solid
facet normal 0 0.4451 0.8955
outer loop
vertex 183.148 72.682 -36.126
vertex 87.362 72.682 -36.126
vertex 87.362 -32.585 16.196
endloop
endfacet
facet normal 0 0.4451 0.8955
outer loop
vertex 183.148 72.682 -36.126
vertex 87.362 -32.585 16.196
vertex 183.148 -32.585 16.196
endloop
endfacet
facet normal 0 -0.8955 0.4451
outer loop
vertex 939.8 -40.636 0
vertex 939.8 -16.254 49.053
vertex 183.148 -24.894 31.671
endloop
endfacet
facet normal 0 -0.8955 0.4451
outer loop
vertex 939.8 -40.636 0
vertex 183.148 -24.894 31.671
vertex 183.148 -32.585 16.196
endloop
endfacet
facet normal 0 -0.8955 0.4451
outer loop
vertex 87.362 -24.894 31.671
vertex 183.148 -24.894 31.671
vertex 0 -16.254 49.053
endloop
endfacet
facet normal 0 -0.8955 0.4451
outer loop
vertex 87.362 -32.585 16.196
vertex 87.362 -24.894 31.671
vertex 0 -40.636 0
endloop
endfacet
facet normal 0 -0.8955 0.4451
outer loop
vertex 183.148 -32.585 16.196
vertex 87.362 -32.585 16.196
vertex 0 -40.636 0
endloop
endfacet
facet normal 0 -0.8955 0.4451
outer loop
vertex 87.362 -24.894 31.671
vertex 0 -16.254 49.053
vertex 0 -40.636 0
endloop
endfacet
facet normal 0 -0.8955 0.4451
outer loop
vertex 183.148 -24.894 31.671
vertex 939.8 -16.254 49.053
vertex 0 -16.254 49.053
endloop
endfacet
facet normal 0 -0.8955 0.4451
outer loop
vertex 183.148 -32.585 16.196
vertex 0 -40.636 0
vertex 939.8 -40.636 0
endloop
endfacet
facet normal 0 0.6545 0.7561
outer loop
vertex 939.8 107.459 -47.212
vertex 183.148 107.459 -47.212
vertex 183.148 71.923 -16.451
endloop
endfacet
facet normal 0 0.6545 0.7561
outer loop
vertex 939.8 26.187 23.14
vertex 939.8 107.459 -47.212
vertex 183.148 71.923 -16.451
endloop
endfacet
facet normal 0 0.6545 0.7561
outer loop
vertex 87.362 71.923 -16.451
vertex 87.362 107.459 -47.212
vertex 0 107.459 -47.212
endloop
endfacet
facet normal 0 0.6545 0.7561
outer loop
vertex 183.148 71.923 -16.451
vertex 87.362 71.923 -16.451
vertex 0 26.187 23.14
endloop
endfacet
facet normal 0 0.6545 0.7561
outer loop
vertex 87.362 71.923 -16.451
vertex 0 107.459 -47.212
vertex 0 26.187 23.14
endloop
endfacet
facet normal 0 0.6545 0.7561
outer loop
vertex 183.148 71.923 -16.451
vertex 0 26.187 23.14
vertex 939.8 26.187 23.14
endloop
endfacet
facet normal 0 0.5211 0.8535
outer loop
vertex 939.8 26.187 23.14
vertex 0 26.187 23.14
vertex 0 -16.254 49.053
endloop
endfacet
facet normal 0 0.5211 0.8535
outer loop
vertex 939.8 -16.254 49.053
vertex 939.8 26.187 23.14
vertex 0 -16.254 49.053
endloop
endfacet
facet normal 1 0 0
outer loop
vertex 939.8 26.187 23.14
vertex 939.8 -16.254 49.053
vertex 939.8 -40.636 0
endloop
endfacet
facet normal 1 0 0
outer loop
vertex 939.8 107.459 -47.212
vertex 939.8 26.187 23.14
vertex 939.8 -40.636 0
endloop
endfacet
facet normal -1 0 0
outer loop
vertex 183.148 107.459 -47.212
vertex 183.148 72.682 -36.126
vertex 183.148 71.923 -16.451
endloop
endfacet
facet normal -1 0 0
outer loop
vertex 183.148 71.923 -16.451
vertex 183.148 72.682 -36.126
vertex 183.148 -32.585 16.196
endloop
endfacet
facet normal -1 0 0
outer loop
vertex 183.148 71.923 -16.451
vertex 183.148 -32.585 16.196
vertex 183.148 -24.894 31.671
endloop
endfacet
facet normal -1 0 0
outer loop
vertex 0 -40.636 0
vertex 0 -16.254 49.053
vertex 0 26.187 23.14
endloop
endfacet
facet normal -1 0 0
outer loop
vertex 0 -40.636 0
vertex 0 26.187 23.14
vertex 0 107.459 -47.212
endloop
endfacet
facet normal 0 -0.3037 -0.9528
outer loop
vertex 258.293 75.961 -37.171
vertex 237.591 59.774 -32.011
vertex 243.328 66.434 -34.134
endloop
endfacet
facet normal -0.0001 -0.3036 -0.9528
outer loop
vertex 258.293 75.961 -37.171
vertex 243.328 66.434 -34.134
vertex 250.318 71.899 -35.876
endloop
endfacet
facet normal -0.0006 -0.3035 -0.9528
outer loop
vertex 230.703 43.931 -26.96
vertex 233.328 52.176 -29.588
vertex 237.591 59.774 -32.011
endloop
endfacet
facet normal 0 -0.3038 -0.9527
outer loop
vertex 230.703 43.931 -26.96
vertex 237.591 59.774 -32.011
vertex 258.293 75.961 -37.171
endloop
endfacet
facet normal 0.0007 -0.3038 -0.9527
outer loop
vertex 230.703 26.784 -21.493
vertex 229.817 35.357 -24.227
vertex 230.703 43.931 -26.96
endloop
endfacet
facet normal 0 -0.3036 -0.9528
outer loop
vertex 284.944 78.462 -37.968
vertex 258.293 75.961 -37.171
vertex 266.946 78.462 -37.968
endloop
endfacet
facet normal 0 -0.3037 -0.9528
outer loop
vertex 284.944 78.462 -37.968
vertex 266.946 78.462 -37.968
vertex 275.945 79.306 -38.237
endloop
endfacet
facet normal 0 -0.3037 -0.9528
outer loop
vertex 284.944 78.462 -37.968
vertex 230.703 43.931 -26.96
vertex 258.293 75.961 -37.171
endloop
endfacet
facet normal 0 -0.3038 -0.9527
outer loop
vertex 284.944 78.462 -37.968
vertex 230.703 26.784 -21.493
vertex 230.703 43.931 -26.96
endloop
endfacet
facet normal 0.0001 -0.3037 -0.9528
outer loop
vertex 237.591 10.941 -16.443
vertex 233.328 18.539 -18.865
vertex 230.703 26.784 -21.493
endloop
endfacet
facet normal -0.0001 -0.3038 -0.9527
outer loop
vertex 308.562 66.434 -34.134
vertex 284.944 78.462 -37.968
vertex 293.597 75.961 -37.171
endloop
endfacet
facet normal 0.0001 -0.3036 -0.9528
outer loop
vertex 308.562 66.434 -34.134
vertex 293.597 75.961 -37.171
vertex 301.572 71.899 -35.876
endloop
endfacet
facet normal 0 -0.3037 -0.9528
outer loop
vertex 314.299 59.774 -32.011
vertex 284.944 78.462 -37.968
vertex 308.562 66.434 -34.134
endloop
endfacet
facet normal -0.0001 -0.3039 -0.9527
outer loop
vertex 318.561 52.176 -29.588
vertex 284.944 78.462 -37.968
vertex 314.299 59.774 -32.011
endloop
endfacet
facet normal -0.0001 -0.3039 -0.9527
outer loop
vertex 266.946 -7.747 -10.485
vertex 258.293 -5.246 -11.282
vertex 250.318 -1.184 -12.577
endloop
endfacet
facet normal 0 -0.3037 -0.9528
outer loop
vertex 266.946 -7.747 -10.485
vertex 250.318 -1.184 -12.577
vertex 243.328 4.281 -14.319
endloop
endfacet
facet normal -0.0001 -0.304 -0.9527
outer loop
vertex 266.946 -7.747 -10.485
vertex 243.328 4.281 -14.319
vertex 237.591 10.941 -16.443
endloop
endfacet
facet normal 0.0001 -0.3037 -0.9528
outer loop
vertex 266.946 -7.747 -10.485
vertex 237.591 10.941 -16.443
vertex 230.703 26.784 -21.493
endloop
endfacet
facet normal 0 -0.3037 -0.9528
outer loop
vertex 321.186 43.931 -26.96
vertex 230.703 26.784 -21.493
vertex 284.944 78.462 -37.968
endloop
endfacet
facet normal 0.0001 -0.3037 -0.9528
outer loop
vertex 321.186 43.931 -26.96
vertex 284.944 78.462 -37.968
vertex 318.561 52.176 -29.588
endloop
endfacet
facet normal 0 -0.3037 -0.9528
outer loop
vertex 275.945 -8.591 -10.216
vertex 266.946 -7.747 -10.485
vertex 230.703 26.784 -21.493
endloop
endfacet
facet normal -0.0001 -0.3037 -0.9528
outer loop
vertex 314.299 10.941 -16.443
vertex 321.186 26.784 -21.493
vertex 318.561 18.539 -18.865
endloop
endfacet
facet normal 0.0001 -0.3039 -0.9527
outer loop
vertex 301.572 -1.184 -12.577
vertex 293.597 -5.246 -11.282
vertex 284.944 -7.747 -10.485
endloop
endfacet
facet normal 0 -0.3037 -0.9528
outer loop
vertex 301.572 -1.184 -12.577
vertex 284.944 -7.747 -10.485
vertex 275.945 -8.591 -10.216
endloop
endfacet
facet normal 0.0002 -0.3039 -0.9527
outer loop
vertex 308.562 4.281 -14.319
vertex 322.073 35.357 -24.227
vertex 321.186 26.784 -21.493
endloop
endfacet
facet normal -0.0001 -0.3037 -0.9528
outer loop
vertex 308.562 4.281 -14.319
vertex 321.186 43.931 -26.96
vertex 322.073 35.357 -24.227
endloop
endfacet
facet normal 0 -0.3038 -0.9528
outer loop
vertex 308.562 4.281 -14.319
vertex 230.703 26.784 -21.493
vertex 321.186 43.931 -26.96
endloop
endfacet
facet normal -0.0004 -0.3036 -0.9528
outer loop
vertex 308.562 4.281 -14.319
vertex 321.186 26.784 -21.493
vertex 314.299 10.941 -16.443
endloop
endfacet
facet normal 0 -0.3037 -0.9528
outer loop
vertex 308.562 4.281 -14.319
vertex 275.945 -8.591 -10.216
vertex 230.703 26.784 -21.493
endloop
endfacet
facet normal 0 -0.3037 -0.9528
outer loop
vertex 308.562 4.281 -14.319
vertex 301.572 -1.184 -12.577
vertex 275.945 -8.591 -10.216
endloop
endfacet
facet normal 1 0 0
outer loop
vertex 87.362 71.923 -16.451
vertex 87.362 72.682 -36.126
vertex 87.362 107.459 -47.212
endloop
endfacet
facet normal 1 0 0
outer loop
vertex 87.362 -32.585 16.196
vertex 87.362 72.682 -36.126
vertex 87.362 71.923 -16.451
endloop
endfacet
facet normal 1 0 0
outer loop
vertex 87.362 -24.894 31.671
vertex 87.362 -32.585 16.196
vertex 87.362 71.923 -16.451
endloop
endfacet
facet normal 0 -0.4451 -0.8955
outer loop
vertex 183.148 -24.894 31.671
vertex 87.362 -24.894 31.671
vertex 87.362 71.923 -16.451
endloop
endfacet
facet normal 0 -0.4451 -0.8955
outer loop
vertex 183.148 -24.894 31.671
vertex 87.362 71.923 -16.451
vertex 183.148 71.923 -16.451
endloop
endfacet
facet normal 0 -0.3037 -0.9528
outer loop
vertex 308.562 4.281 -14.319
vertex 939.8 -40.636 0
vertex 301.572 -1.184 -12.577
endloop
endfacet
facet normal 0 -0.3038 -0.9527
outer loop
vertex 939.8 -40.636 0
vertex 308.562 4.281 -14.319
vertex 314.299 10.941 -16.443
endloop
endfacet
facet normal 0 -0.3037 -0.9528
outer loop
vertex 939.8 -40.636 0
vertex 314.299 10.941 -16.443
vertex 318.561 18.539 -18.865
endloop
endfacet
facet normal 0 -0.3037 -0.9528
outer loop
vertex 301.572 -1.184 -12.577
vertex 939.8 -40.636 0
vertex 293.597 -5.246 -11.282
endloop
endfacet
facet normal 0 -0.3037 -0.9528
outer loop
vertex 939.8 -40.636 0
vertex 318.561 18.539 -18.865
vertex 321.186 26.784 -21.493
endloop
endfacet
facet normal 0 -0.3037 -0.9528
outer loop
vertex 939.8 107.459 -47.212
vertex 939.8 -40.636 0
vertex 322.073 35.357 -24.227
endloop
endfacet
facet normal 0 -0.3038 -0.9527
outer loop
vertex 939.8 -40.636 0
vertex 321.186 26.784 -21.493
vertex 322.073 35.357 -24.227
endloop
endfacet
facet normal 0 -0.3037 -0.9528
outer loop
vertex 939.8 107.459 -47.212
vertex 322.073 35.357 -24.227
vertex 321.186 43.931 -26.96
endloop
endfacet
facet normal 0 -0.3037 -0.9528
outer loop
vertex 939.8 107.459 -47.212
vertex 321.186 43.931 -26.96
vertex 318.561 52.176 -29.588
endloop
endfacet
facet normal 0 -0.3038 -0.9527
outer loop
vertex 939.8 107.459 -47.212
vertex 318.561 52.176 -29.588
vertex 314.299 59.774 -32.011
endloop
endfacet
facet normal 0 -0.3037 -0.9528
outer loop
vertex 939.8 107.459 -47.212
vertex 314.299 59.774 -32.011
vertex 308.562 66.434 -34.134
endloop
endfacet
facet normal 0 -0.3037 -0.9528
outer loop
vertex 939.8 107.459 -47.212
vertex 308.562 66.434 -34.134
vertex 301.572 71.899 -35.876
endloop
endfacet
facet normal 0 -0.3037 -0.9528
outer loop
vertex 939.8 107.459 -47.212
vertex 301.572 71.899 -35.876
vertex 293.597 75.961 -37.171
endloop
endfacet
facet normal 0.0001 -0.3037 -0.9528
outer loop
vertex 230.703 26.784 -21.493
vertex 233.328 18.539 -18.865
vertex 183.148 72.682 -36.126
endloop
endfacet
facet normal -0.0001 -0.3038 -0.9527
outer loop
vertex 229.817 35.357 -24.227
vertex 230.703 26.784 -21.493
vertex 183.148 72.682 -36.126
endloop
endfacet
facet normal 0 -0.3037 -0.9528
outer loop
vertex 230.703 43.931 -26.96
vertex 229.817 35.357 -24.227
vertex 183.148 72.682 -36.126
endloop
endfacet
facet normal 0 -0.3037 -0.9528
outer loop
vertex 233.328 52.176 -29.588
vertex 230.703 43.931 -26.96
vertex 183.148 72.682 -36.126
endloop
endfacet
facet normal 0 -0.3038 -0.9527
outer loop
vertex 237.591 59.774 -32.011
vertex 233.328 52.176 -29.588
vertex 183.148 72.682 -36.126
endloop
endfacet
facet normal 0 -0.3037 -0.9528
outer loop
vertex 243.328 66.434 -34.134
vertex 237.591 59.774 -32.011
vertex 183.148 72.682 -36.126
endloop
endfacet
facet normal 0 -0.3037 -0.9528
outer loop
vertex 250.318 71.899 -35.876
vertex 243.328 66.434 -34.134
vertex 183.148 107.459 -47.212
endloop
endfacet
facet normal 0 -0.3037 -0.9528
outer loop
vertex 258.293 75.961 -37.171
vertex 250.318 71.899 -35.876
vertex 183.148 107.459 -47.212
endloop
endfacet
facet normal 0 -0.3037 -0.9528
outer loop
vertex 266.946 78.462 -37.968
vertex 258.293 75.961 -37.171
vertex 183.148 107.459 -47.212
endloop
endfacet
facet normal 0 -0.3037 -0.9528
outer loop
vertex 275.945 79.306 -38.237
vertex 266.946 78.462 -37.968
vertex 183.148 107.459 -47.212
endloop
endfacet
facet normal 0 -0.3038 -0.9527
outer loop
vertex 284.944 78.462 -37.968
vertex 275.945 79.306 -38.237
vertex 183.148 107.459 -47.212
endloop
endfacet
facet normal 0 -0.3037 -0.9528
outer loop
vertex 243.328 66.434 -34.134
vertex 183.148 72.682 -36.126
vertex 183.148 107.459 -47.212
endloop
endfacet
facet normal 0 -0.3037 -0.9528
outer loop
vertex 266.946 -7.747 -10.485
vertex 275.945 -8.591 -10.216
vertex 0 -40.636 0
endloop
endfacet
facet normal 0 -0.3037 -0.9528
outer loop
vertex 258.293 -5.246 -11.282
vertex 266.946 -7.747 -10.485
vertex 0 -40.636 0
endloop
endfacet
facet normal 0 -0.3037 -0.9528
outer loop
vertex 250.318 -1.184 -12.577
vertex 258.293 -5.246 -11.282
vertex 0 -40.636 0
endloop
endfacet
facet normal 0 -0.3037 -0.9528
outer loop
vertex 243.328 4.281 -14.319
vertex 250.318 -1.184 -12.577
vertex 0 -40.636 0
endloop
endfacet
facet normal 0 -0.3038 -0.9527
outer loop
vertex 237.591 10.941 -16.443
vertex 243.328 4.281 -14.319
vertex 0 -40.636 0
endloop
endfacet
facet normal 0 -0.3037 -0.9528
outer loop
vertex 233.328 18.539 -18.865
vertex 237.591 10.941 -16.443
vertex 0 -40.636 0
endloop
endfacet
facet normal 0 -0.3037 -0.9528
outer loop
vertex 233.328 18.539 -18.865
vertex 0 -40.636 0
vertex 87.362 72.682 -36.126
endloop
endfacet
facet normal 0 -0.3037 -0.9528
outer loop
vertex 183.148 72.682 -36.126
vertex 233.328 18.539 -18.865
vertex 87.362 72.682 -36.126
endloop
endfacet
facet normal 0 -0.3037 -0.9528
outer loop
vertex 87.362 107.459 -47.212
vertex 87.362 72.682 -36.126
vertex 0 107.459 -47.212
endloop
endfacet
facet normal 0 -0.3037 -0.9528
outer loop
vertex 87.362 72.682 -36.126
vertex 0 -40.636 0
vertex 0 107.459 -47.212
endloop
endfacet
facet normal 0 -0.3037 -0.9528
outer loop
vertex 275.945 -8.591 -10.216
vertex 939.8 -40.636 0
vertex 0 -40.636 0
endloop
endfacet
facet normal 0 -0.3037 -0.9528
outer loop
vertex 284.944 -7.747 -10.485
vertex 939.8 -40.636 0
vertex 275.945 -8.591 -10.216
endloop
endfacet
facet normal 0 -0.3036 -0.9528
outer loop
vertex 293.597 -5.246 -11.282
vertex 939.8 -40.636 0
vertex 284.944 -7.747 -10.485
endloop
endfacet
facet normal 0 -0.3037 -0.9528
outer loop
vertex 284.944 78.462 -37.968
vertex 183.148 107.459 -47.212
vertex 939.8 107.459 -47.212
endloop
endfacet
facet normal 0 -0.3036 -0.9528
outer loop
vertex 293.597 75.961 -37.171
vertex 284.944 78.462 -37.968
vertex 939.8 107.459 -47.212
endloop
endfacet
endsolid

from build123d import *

# Parameters (mm, degrees)
F1_DEPTH = 939.8
F2_W     = 95.7861989737
F2_H     = 17.2806475312
F3_DEPTH = 153.6309794951
F4_R     = 46.1278485026
F5_DEPTH = 44.9828275762


with BuildPart() as f1:
    # F0 (on Right) → F1 (new body)
    with BuildSketch(Plane.YZ):
        Polygon((-16.2542276084, 49.0534752607), (-40.6355895102, 0), (107.4585616589, -47.2123473883), (26.1873789132, 23.1404751539), align=None)
    extrude(amount=F1_DEPTH)

    # F2 (on face) → F3 (cut, through all)
    with BuildSketch(Plane(origin=(0, -32.5854994089, 16.1961787542), x_dir=(1, 0, 0), z_dir=(0, -0.8954862226, 0.4450892328))):
        with Locations((135.2553740144, 8.6403237656)):
            Rectangle(F2_W, F2_H)
    extrude(amount=-F3_DEPTH, mode=Mode.SUBTRACT)

    # F4 (on face) → F5 (cut, through all)
    with BuildSketch(Plane(origin=(0, -3.7489093909, -11.7594566838), x_dir=(1, 0, 0), z_dir=(0, -0.3037380425, -0.9527555833))):
        with Locations((275.9448885918, -41.0455577075)):
            Circle(F4_R)
    extrude(amount=F5_DEPTH, mode=Mode.SUBTRACT)


solid = f1.part
